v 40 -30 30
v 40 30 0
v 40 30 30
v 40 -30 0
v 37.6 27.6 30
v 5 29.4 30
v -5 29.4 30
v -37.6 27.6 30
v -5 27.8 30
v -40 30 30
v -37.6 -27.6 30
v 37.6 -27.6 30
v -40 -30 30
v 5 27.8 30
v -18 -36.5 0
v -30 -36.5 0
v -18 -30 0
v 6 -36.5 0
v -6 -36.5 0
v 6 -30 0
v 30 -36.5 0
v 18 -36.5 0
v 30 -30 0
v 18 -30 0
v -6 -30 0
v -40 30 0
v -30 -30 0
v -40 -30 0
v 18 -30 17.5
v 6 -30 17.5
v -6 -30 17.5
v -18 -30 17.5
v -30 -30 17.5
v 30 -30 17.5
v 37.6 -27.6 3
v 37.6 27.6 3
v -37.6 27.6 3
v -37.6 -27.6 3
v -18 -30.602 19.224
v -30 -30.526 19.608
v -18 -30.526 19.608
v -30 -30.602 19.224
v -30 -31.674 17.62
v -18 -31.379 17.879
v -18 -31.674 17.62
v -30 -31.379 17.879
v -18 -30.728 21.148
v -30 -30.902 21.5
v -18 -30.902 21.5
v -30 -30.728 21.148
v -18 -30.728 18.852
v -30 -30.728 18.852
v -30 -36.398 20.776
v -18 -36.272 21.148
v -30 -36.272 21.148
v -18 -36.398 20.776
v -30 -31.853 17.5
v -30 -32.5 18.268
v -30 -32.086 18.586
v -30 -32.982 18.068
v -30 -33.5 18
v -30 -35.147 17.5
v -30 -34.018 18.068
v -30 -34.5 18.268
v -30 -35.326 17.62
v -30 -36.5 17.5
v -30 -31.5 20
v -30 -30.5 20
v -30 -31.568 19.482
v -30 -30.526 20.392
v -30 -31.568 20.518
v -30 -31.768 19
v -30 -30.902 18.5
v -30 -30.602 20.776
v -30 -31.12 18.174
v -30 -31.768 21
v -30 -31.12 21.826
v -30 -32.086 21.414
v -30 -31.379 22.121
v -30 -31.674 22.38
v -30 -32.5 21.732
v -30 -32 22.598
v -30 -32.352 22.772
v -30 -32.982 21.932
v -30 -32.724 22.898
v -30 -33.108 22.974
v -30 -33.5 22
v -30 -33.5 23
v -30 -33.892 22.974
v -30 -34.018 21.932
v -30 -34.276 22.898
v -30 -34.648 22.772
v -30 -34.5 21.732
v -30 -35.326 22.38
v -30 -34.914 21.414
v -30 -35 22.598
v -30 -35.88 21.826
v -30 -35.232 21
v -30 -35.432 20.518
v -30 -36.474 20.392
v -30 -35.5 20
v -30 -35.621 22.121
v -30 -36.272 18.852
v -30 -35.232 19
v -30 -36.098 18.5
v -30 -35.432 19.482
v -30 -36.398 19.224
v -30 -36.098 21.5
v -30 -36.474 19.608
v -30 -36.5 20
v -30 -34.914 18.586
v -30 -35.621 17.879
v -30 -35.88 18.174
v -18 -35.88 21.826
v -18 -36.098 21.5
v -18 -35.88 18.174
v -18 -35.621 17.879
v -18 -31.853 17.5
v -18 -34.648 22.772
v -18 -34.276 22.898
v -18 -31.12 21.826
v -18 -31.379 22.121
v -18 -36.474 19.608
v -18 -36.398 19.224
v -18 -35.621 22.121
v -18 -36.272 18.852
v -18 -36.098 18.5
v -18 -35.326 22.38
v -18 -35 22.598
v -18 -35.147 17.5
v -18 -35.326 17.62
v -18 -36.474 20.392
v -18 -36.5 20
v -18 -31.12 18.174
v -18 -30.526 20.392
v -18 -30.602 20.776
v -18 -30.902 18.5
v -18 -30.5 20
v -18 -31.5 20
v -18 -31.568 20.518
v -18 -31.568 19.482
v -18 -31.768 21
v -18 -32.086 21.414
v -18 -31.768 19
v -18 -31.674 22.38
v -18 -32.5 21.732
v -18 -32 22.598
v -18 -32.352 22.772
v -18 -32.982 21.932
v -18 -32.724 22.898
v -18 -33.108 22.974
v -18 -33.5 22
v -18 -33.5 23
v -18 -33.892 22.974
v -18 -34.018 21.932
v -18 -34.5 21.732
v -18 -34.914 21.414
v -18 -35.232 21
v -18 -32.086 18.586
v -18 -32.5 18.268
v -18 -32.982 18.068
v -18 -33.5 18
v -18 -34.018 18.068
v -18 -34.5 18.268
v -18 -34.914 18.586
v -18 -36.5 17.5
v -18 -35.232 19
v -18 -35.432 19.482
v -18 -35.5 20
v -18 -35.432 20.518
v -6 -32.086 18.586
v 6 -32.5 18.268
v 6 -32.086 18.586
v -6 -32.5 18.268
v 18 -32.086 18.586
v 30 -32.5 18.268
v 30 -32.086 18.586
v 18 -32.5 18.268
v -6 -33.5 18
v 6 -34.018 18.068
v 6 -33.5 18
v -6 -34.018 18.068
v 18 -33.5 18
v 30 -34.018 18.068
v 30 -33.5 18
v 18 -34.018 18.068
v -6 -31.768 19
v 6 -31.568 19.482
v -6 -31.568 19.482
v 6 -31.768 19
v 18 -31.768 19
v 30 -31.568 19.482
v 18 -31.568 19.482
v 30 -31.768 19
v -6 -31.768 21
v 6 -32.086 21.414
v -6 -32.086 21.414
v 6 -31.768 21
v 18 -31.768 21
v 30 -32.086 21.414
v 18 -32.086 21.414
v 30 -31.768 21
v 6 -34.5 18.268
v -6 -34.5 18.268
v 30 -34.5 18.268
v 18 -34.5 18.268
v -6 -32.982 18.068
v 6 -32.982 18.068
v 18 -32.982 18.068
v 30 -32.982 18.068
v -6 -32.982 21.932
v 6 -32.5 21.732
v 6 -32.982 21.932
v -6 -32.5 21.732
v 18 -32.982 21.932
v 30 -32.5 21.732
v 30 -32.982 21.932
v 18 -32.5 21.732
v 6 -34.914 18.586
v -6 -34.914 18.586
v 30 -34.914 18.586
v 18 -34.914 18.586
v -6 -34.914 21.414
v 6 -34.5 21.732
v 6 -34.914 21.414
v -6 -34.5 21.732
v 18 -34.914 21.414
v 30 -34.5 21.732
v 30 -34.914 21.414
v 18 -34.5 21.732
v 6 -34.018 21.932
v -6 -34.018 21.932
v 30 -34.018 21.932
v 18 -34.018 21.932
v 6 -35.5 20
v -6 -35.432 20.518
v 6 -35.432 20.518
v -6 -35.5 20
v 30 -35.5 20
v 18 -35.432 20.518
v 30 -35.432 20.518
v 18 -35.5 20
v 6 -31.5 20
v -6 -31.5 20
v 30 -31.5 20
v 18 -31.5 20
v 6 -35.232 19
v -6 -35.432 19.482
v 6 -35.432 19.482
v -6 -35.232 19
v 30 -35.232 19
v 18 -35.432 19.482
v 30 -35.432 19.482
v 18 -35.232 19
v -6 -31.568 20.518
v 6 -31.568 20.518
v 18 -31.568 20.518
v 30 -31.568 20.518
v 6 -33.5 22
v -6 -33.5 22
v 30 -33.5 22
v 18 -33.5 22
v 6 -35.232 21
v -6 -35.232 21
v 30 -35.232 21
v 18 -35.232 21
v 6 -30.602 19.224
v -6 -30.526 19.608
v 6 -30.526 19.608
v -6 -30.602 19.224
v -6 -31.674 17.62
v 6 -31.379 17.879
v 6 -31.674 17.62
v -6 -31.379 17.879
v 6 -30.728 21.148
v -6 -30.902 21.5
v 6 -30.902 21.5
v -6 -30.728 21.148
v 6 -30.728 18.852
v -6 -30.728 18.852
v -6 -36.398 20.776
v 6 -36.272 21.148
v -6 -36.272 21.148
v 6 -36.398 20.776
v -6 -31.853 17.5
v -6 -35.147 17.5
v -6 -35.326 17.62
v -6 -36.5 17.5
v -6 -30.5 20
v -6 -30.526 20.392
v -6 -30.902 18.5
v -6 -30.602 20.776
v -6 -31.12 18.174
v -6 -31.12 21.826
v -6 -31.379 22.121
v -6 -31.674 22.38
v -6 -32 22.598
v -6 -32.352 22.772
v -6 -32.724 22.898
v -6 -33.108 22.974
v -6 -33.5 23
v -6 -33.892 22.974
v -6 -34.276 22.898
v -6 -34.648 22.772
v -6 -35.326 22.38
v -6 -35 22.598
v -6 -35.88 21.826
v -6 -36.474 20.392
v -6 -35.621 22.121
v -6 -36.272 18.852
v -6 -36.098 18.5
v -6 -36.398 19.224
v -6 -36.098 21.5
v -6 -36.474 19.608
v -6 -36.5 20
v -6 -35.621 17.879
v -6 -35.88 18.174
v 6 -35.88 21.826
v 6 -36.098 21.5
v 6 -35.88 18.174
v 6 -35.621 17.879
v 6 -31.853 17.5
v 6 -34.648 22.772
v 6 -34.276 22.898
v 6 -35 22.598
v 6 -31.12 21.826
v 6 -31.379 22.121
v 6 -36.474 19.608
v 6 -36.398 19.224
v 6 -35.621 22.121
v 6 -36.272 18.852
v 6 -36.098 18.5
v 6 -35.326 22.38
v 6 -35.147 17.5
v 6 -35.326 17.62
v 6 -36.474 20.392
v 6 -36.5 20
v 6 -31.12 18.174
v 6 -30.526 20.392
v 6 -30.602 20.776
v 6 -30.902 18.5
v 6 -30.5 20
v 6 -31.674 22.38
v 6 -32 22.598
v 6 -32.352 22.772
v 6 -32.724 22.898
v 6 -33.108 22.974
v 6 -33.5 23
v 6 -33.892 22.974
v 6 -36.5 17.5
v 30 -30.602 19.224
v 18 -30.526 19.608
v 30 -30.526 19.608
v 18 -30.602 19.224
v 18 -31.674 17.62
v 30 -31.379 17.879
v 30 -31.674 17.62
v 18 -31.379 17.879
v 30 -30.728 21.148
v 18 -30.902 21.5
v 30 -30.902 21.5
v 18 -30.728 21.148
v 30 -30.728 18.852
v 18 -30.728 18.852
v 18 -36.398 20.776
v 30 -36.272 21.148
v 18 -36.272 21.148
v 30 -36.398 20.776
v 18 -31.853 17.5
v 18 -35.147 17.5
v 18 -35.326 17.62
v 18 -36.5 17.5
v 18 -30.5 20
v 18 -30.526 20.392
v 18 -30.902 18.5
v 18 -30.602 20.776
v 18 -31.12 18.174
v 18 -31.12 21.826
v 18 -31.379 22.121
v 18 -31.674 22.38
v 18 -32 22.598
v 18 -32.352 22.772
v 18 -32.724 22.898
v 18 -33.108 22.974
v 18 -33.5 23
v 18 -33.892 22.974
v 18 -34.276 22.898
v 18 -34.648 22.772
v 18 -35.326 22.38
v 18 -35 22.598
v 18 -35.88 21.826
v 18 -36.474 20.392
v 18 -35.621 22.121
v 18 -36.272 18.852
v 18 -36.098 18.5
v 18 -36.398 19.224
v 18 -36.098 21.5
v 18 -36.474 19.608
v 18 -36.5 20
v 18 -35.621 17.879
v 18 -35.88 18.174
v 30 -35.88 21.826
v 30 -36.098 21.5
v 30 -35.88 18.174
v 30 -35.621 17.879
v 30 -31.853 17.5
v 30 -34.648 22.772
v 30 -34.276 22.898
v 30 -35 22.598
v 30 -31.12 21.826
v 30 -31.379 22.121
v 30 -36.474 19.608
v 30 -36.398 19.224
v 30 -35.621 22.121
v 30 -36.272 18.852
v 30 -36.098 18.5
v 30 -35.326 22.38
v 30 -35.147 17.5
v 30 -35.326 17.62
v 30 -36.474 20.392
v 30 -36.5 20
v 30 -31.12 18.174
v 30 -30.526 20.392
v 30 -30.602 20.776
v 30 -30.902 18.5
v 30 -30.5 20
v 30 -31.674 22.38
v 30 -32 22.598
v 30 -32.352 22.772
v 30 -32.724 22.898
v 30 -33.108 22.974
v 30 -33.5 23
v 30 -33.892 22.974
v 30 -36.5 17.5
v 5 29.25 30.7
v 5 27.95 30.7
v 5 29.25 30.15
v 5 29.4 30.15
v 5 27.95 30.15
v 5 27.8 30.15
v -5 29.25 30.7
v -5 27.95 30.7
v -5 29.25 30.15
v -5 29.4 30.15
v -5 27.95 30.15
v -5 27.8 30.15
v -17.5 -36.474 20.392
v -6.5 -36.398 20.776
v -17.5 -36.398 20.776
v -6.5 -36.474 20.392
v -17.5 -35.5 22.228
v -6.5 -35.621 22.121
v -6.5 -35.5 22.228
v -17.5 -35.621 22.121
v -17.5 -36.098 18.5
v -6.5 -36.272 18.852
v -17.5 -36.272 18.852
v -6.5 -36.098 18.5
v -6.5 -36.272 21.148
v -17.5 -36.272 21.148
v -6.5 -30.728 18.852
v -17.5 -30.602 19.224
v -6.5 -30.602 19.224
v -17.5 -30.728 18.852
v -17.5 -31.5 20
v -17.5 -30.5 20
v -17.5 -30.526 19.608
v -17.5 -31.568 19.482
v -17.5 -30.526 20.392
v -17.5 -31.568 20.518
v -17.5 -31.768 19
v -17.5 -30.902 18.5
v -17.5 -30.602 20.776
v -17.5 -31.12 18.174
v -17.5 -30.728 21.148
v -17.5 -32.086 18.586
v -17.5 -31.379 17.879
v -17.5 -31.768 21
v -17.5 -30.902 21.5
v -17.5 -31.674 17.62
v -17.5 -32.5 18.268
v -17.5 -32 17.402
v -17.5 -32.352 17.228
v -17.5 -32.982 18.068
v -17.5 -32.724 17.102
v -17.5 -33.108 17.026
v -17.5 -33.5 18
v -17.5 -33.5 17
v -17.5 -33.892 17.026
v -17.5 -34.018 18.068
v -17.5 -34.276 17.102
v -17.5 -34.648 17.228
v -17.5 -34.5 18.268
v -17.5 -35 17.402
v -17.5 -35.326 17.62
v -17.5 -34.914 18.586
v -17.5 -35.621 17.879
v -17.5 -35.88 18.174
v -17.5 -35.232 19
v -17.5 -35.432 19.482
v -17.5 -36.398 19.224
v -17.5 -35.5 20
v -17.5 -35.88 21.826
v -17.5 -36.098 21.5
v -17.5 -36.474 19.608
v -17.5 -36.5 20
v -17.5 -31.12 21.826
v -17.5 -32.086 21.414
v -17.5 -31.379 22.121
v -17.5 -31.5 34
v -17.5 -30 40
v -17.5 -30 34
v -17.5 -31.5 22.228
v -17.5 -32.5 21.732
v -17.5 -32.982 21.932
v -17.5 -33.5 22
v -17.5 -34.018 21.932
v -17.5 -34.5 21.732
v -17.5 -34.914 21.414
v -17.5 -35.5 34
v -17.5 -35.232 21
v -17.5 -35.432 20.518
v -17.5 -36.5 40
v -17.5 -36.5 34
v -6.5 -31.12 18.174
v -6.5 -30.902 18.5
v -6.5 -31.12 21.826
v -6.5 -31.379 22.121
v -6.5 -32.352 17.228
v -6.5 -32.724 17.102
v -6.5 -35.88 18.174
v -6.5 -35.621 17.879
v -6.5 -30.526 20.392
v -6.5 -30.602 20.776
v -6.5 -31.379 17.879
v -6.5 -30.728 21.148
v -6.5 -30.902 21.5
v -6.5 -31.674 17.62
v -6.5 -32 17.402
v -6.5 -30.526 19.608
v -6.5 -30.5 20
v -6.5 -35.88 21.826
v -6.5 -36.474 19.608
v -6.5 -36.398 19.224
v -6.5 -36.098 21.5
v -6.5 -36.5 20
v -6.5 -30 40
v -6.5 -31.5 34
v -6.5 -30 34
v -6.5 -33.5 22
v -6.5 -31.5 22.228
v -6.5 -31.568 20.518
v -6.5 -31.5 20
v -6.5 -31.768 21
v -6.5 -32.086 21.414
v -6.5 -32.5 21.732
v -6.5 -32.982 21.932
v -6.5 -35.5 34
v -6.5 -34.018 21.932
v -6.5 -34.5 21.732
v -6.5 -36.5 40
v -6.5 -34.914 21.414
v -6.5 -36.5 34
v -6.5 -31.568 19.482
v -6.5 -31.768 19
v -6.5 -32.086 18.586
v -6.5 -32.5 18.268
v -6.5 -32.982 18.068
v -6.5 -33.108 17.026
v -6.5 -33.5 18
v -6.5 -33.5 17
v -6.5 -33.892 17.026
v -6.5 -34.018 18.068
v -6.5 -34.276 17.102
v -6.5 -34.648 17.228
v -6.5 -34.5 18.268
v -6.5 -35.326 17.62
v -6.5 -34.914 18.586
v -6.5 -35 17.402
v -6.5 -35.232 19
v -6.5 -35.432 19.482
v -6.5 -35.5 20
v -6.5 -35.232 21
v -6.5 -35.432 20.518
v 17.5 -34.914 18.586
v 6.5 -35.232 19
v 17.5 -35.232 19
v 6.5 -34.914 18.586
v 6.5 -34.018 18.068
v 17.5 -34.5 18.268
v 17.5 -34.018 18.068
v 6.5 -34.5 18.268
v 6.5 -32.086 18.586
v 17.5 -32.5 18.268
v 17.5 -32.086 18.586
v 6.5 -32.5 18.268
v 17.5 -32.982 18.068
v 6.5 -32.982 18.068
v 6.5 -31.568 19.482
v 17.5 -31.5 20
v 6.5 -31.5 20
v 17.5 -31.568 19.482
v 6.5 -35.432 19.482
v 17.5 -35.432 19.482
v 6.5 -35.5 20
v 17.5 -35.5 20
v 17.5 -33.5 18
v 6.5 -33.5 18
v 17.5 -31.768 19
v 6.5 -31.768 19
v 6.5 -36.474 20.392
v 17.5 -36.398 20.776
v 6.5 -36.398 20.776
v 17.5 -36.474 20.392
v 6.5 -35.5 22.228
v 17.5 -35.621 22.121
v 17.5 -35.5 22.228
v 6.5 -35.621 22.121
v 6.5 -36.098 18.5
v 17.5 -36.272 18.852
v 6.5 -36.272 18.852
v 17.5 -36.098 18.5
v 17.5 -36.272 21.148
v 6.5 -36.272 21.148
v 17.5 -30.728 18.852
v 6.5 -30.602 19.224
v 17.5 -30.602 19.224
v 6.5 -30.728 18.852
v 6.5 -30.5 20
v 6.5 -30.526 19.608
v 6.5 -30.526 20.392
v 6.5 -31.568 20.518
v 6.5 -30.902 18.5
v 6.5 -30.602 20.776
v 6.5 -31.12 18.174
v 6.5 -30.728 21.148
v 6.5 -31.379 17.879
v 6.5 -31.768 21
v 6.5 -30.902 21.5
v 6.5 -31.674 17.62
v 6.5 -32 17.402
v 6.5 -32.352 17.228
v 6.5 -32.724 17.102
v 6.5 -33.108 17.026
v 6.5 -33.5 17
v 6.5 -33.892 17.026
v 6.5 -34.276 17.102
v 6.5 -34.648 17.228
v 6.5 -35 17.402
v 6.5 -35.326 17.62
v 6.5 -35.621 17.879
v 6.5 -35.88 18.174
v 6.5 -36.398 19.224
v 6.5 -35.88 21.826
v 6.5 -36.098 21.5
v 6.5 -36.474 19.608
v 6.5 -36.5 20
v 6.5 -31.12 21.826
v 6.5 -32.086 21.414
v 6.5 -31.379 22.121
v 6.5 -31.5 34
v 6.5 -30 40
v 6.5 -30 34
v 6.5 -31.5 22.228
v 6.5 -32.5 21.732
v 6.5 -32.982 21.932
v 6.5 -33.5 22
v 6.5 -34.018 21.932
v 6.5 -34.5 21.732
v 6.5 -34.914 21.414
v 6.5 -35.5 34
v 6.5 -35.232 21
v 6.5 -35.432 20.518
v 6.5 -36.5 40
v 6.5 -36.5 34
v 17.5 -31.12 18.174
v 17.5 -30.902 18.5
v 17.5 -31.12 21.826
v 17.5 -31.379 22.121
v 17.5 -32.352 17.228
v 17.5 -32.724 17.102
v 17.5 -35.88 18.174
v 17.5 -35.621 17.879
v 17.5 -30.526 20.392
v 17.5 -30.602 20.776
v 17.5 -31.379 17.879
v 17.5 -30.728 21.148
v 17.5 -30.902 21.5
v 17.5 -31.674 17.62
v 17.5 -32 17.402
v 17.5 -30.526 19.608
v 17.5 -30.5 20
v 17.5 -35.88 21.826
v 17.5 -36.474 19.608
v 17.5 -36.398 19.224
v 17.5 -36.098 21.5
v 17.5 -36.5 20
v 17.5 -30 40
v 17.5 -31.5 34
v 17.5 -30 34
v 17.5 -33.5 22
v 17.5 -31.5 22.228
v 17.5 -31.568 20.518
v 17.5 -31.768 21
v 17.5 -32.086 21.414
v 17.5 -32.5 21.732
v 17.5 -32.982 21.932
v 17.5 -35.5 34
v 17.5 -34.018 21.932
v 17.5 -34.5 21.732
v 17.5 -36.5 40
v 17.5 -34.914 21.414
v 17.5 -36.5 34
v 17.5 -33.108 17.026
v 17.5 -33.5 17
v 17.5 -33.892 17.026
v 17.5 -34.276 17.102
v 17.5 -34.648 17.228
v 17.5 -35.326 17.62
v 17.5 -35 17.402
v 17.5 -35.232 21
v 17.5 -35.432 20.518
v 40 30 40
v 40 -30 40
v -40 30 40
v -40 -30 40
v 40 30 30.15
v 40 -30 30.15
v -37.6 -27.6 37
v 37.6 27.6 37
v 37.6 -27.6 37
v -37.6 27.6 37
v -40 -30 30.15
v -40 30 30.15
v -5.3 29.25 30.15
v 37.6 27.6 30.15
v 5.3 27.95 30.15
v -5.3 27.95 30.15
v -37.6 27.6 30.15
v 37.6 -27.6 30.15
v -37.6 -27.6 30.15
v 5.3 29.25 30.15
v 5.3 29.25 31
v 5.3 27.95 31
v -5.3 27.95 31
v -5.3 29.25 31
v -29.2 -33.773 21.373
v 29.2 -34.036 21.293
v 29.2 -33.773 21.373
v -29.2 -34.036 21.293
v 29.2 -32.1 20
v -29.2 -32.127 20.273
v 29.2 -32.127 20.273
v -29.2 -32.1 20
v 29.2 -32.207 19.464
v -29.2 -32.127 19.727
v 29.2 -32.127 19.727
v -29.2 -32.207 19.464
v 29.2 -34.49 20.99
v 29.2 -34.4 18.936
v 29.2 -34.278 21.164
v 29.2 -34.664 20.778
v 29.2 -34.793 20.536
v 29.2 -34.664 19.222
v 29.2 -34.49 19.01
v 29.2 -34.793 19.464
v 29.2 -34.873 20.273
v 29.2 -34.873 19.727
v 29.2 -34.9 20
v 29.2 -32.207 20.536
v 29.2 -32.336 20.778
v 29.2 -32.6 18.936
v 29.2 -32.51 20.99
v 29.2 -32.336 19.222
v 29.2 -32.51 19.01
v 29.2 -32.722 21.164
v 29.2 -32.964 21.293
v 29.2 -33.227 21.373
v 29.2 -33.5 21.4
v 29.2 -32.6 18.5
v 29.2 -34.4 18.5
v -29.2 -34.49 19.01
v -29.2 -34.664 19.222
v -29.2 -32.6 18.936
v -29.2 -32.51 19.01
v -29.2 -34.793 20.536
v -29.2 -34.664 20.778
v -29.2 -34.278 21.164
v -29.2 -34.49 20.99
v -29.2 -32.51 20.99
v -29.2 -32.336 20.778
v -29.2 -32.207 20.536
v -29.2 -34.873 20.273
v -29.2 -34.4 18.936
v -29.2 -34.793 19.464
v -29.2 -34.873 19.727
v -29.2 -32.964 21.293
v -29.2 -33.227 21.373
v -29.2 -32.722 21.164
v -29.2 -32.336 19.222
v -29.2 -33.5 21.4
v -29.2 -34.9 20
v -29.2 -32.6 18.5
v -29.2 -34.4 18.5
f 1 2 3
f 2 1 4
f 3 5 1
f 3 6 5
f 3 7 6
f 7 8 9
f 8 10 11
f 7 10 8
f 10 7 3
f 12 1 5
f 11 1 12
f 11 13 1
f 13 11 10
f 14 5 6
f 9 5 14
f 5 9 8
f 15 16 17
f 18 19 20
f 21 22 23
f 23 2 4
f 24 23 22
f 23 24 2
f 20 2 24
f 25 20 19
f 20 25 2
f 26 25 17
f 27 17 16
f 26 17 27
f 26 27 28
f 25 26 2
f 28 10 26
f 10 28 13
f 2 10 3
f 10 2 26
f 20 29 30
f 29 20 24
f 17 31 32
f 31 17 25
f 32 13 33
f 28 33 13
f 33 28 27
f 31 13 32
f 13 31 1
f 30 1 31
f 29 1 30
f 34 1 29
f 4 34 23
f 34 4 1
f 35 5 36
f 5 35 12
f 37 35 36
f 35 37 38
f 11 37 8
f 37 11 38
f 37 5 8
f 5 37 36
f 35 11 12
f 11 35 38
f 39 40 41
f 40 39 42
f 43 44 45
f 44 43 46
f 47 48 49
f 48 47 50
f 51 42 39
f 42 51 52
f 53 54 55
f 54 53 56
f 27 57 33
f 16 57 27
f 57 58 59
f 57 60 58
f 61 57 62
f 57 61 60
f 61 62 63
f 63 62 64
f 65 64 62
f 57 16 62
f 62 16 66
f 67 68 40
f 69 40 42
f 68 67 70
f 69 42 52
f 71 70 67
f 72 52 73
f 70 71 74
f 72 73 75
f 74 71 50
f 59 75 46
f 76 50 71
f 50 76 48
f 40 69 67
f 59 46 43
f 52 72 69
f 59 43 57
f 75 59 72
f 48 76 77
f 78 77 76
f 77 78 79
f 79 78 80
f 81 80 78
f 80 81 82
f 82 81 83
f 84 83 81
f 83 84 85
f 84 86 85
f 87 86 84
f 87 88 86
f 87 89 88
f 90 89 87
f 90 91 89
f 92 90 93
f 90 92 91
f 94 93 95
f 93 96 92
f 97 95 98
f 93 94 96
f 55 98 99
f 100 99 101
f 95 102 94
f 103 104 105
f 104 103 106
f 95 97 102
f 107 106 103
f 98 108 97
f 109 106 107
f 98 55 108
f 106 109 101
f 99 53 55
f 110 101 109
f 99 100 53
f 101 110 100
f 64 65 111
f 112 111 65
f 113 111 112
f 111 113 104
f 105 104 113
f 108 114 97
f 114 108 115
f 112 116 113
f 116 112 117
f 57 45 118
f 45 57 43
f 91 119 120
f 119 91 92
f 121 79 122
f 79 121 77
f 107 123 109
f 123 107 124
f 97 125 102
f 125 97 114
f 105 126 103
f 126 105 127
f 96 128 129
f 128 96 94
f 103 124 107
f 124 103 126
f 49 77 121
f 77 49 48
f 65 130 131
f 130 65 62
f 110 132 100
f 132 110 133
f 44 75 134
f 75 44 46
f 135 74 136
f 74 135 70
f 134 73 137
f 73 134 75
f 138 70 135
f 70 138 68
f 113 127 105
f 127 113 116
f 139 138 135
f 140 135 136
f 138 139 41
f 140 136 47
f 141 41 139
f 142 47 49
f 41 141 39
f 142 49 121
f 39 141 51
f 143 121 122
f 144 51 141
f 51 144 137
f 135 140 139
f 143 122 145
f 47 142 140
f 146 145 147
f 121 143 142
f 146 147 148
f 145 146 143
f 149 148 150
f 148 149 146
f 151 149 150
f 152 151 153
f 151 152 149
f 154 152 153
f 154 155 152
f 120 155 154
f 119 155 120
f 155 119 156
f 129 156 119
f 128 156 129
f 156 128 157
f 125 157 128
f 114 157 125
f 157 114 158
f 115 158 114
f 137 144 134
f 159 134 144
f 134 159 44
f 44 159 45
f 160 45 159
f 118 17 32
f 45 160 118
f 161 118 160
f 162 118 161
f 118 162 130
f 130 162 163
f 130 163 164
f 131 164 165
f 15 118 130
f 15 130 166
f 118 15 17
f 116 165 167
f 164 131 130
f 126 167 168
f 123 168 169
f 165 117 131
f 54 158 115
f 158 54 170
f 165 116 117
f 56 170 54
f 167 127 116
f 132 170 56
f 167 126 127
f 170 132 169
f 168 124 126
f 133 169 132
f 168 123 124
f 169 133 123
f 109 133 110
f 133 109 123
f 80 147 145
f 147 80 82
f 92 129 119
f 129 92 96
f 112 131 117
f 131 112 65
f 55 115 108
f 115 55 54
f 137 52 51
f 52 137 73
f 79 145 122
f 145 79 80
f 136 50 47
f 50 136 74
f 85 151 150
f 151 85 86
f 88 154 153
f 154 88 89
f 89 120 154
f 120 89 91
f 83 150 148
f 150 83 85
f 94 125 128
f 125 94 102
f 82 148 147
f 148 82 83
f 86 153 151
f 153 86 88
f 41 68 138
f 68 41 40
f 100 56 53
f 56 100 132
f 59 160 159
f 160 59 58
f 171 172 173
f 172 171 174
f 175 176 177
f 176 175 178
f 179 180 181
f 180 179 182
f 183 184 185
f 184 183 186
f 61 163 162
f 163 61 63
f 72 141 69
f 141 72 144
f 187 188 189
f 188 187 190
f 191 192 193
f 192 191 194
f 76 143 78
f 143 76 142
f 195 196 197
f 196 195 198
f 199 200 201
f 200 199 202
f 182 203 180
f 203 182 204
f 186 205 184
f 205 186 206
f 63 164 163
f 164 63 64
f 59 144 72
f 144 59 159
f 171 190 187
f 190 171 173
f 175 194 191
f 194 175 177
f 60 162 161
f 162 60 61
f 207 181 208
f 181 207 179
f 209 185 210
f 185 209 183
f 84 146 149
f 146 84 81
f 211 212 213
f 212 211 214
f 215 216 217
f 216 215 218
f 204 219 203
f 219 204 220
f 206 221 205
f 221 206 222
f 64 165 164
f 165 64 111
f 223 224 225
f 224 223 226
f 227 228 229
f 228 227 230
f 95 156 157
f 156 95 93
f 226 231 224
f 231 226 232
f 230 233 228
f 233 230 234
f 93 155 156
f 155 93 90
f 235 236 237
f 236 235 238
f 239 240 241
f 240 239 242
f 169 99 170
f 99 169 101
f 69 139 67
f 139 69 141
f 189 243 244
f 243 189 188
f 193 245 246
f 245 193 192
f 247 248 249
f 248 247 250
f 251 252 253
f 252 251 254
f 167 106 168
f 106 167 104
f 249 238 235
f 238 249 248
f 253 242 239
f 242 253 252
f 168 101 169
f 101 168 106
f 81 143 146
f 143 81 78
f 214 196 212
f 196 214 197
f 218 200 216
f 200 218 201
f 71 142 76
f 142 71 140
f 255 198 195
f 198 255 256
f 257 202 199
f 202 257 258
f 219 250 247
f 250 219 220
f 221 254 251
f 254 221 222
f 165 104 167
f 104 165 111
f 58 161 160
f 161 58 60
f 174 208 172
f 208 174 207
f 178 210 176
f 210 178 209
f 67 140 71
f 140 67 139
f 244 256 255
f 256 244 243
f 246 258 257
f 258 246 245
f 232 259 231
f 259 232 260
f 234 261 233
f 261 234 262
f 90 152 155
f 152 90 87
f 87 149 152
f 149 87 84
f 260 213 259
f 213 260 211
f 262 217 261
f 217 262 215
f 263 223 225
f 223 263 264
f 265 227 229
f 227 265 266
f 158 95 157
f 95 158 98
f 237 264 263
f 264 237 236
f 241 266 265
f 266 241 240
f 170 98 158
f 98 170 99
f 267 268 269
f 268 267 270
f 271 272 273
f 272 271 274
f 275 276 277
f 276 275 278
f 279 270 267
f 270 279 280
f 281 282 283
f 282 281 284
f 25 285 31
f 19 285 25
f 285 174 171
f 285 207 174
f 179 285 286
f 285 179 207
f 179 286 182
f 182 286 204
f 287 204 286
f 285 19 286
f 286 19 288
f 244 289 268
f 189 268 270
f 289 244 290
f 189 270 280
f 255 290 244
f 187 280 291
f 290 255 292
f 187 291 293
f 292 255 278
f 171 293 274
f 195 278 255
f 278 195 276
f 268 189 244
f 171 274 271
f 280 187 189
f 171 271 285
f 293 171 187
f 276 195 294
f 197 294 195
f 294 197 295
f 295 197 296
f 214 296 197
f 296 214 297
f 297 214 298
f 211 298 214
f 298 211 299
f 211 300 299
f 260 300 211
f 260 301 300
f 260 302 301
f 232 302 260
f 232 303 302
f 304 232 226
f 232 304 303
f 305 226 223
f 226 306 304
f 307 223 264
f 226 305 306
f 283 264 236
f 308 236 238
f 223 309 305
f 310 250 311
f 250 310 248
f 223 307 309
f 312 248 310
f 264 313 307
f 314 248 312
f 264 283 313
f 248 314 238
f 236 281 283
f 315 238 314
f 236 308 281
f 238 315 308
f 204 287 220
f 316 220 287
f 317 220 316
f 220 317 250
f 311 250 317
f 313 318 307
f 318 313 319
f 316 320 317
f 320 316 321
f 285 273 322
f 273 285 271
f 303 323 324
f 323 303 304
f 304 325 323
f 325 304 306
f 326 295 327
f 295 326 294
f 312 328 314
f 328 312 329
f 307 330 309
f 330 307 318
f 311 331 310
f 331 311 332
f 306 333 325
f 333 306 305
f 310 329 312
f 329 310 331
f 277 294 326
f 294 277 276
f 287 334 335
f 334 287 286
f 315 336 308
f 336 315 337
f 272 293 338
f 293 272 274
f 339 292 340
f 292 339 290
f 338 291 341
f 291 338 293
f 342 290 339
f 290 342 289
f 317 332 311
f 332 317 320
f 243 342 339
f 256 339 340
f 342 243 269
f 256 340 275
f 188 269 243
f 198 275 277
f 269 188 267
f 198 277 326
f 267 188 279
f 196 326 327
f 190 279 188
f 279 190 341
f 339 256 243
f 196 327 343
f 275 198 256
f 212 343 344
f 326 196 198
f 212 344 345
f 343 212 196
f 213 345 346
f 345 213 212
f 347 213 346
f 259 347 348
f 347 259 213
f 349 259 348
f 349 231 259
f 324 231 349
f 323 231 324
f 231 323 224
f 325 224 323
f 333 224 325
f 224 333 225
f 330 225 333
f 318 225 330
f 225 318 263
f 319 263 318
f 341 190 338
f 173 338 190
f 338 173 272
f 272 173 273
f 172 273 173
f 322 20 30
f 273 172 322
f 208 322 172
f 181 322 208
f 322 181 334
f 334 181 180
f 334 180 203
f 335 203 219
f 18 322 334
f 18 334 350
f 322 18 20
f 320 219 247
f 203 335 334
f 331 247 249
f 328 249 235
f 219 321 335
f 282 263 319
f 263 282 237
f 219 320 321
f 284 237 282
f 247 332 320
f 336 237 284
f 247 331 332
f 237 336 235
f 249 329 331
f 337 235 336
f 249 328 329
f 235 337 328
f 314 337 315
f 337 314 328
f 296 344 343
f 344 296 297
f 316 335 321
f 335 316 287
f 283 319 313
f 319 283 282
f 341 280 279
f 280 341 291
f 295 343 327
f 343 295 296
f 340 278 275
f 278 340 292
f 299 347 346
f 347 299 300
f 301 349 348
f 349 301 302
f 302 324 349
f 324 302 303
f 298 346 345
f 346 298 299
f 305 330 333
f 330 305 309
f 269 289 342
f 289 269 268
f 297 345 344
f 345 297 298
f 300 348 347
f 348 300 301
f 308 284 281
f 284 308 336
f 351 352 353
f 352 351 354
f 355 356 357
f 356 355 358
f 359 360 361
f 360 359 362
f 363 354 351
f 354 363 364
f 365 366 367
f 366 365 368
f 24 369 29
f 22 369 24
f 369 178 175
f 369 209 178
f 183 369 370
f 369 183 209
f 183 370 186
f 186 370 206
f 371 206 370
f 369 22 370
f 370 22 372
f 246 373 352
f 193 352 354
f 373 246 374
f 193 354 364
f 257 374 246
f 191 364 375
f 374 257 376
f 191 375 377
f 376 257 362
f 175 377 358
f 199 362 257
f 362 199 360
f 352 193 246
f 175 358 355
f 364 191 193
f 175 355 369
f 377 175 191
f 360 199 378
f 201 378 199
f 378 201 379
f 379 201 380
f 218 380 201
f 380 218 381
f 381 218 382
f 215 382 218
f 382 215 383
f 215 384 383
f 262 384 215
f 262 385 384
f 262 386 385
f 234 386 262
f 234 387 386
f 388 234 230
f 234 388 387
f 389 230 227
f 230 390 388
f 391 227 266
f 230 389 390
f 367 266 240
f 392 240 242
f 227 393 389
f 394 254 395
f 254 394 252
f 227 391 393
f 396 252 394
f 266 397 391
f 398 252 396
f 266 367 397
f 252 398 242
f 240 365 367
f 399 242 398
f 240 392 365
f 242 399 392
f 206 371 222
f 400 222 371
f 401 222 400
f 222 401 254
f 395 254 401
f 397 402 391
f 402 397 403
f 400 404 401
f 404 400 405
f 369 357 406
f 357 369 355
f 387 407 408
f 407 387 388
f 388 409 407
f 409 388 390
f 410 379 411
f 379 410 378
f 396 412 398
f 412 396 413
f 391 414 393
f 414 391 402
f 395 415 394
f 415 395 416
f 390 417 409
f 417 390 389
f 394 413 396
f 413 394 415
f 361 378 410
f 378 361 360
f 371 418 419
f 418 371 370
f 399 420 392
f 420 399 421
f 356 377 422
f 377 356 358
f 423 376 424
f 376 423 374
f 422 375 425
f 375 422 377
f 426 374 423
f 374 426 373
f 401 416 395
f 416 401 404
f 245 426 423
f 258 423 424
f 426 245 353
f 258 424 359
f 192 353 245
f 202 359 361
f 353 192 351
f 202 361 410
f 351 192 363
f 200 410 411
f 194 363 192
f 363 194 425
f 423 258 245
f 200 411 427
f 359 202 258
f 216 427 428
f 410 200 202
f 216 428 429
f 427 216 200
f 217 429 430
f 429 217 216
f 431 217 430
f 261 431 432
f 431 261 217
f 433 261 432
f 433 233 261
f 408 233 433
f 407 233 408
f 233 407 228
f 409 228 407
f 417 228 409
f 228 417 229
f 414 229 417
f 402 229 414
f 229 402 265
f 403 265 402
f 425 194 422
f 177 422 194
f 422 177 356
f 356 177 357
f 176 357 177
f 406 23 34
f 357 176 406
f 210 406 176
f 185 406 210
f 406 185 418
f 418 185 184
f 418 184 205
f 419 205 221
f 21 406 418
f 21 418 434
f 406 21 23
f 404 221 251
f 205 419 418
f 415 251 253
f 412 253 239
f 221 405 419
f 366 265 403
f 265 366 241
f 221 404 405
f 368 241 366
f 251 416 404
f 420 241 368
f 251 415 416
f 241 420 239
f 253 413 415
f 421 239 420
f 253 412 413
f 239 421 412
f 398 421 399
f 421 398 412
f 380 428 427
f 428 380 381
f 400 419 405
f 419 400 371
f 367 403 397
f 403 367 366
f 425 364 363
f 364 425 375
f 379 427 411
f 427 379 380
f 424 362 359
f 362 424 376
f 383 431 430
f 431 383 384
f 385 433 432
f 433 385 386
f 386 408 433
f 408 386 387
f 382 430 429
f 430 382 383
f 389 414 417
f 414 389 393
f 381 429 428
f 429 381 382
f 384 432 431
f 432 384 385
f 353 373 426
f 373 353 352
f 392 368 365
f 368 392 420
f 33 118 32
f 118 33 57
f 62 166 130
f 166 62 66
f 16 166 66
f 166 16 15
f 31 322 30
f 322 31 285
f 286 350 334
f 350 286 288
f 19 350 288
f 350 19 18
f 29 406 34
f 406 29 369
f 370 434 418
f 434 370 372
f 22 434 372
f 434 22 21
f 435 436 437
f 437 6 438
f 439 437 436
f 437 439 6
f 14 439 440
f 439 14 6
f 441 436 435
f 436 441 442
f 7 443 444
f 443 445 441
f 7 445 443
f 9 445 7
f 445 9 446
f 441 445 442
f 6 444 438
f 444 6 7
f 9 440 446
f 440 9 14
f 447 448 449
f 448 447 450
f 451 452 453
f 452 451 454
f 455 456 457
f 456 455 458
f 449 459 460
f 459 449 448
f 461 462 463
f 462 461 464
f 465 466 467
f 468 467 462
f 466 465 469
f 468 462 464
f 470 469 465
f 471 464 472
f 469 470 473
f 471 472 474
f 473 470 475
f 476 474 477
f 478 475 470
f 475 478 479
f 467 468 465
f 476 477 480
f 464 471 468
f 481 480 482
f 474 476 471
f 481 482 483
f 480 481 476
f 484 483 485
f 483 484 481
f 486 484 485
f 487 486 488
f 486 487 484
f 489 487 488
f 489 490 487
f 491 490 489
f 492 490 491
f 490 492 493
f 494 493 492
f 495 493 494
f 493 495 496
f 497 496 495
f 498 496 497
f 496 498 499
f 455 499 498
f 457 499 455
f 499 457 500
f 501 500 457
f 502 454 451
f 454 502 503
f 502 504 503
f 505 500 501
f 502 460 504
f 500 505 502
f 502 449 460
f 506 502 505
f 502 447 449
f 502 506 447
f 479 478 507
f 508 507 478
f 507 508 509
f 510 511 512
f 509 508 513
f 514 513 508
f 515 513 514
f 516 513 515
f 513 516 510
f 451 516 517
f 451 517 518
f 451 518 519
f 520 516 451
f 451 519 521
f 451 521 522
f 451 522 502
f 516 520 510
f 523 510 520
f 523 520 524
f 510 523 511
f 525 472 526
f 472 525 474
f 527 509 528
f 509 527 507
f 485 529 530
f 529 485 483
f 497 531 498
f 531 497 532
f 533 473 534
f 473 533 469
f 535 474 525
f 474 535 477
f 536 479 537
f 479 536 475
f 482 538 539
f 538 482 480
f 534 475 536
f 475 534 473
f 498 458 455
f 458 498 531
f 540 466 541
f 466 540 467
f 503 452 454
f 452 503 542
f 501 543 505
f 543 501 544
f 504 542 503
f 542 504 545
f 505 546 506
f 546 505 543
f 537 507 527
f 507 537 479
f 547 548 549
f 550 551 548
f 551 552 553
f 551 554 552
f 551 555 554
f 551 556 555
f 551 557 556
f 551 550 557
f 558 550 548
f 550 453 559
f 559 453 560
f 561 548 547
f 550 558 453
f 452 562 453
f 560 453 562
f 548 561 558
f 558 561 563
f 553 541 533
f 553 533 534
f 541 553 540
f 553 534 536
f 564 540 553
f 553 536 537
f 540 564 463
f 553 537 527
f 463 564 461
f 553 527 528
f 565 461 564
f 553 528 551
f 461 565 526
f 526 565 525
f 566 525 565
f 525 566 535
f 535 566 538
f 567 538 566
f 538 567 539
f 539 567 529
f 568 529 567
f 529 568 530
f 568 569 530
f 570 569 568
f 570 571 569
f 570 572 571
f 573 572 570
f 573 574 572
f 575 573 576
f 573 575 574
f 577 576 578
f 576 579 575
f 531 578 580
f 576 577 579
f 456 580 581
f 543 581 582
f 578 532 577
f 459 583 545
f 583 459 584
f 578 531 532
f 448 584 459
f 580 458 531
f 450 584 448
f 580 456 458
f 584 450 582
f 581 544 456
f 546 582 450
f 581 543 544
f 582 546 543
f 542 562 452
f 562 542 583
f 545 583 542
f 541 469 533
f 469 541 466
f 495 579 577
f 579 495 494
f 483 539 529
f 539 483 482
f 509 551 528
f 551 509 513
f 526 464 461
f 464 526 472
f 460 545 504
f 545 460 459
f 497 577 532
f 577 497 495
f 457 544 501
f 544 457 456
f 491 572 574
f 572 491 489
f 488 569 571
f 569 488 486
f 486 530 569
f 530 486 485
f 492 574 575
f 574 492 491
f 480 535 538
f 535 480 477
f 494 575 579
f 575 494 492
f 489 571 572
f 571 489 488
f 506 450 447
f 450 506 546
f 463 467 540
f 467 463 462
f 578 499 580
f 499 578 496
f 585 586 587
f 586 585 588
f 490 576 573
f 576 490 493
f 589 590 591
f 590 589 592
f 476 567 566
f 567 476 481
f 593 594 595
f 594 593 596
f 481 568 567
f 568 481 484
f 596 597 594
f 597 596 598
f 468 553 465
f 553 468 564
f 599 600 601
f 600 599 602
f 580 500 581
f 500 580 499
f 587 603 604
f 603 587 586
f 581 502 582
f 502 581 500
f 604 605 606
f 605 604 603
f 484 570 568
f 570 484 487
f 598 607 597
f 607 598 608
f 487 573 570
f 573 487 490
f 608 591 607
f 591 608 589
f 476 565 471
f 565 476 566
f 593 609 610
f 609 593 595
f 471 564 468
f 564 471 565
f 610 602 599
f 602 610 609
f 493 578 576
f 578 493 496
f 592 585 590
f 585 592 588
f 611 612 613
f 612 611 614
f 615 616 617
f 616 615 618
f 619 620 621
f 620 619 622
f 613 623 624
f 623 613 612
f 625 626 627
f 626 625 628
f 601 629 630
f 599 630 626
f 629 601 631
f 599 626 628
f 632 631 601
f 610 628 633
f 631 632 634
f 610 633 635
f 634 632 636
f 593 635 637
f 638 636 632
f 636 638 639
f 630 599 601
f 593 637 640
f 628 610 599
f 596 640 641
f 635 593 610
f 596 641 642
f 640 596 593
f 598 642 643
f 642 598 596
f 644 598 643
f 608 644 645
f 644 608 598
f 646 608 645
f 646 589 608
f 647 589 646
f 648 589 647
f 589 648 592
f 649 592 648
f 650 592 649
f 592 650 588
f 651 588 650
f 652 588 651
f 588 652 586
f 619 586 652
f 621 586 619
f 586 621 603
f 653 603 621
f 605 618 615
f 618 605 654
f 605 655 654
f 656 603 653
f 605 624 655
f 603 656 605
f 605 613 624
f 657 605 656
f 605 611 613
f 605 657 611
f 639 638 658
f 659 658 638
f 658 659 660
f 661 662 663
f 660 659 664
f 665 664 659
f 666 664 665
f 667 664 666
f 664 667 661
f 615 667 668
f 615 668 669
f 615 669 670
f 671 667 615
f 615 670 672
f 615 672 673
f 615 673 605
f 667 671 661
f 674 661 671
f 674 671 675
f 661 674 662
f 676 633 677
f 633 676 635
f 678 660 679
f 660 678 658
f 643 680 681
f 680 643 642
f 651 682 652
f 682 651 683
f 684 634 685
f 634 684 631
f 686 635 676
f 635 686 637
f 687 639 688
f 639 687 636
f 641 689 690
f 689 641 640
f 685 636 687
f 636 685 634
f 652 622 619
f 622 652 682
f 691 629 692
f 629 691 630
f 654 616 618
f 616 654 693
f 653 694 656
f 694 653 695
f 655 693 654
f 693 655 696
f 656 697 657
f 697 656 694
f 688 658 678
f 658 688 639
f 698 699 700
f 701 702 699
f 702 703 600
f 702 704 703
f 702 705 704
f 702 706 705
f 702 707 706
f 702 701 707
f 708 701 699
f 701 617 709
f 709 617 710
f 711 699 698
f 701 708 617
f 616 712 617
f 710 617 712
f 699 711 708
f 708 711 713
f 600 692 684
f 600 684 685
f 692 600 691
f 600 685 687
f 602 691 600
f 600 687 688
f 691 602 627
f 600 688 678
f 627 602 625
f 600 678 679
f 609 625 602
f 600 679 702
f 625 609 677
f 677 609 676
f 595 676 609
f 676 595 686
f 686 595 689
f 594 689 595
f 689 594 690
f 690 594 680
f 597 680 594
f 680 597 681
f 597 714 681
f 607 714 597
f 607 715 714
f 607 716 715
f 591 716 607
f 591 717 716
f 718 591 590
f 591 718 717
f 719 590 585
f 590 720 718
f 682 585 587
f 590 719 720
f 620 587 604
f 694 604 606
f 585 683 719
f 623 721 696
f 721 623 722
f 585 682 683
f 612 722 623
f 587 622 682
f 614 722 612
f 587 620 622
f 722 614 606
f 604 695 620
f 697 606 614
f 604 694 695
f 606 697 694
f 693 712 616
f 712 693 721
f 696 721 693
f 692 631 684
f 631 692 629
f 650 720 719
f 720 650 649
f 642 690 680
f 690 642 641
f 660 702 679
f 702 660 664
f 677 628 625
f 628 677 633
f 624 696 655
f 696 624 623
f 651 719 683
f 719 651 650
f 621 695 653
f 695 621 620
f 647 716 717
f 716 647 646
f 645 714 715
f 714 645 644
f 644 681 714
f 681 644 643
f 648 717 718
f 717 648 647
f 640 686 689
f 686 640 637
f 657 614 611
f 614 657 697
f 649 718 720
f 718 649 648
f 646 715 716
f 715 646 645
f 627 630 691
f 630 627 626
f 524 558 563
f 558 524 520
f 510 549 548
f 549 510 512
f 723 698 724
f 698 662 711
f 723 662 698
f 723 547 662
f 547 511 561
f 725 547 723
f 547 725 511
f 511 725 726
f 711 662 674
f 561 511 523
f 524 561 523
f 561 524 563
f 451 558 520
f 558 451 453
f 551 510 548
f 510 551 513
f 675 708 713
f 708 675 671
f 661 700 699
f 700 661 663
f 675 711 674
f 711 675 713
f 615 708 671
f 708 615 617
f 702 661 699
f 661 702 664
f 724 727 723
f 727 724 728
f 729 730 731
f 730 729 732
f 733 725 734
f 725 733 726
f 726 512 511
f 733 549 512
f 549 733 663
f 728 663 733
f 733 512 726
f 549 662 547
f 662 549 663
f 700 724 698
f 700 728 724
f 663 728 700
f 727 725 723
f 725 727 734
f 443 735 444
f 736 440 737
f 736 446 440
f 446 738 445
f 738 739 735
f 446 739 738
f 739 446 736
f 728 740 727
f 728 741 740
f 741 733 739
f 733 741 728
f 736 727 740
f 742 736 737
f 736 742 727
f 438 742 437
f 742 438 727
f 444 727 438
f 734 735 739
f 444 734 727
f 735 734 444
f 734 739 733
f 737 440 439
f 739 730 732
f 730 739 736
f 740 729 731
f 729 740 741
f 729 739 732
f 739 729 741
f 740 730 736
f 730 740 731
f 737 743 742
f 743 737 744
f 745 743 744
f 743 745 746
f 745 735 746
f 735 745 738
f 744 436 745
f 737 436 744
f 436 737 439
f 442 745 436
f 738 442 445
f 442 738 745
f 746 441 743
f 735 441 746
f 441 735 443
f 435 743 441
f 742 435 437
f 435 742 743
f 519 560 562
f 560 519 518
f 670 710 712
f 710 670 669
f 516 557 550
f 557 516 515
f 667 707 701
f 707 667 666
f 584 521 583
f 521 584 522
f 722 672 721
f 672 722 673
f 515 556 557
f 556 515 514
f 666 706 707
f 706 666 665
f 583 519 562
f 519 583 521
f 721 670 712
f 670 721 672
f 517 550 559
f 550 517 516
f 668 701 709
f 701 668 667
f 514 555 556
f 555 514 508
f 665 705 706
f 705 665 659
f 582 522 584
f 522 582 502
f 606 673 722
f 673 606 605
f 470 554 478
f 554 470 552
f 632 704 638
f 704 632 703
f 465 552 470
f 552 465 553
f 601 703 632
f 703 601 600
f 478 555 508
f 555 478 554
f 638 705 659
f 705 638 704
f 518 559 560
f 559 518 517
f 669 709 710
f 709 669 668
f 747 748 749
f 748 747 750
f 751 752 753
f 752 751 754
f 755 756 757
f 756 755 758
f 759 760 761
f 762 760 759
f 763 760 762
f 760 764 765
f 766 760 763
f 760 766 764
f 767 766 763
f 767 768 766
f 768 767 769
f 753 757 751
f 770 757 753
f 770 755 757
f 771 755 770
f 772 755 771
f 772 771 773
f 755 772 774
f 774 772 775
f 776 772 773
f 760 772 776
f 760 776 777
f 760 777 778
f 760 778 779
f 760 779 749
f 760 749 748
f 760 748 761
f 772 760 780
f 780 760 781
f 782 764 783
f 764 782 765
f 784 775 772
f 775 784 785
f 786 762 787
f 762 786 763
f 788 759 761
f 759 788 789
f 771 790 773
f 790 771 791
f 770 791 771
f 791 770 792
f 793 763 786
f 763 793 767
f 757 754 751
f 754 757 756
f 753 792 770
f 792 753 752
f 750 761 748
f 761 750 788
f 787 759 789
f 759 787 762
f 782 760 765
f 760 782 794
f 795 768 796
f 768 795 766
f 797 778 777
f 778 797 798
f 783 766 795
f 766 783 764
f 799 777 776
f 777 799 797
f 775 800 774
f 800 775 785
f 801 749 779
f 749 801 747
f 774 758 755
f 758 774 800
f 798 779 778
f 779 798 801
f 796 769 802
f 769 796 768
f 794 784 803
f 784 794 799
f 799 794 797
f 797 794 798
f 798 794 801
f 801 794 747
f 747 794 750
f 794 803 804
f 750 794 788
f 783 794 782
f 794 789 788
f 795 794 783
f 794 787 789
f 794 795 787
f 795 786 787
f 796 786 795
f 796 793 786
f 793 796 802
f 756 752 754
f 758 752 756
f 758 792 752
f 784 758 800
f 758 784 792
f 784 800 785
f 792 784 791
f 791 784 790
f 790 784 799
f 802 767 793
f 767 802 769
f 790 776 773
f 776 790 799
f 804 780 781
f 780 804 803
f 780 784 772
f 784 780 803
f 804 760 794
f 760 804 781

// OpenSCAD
part = "assembly"; // [base, lid, pin, assembly]
cadverify_only = "";
module instance(name, part, unit = 1) {
  echo(cadverify_instance = [name, part, unit]);
  if (cadverify_only == "" || cadverify_only == name) children();
}
Ya = -33.5; Za = 20; Kr = 3.0; Br = 2.0; Pr = 1.4;
BX = [[-30,-18],[-6,6],[18,30]];
LX = [[-17.5,-6.5],[6.5,17.5]];
module barrelX(x0, x1) {
  difference() {
    translate([0,Ya,Za]) rotate([0,90,0]) translate([0,0,(x0+x1)/2])
      cylinder(h=x1-x0, r=Kr, center=true, $fn=48);
    translate([0,Ya,Za]) rotate([0,90,0]) translate([0,0,(x0+x1)/2])
      cylinder(h=(x1-x0)+1.0, r=Br, center=true, $fn=24);
  }
}
module base_geom() {
  difference() {
    union() {
      difference() {
        translate([-40,-30,0]) cube([80,60,30]);
        translate([-37.6,-27.6,3]) cube([75.2,55.2,27.01]);
      }
      for (b=BX) {
        translate([b[0],-36.5,0]) cube([b[1]-b[0],6.5,17.5]);
        barrelX(b[0], b[1]);
      }
      translate([-5,27.8,30]) cube([10,1.6,0.7]);
    }
    translate([0,Ya,Za]) rotate([0,90,0]) translate([0,0,0])
      cylinder(h=62, r=Br, center=true, $fn=24);
  }
}
module lid_open() {
  difference() {
    union() {
      translate([-40,-97,0]) cube([80,60,3]);
      translate([-40,-97,3]) cube([80,2.4,6.85]);
      translate([-40,-39.4,3]) cube([80,2.4,6.85]);
      translate([-40,-97,3]) cube([2.4,60,6.85]);
      translate([37.6,-97,3]) cube([2.4,60,6.85]);
      for (b=LX) {
        translate([b[0],-39,0]) cube([b[1]-b[0],8.5,6]);
        translate([b[0],-35.5,3]) cube([b[1]-b[0],4,17.5]);
        barrelX(b[0], b[1]);
      }
    }
    translate([-5.3,-96.25,9.0]) cube([10.6,1.3,1.1]);
    translate([0,Ya,Za]) rotate([0,90,0]) translate([0,0,0])
      cylinder(h=62, r=Br, center=true, $fn=24);
  }
}
module pin_geom() {
  union() {
    translate([-29.2,0,1.5]) rotate([0,90,0])
      cylinder(h=58.4, r=Pr, center=false, $fn=32);
    translate([-29.2,-0.9,0]) cube([58.4,1.8,0.5]);
  }
}
module lid_closed() {
  translate([0,Ya,Za]) rotate([180,0,0]) translate([0,-Ya,-Za]) lid_open();
}
module pin_placed() {
  translate([0,Ya,Za-1.5]) pin_geom();
}
if (part=="base") {
  base_geom();
  echo(cadverify_spec=[
    ["bounds", [[-40,-36.5,0],[40,30,30.7]]],
    ["bodies", 1],
    ["support_faces", [["base","-z",4000]]],
    ["overhangs_allowed", [["hinge", [[-30,-37,16],[30,-30,24]]]]],
    ["copies", 1],
    ["details", [
      ["bottom","thickness",[0,0,-1],[0,0,1],3],
      ["cavity","void",[[-37.6,-27.6,3],[37.6,27.6,30]],0.9],
      ["knuckle","material",[[-30,-36.5,17],[-18,-30.5,23]],0.5],
      ["bore","hole",[-31,-33.5,20],[1,0,0],[[0,4.0],[10,4.0]]],
      ["catch","material",[[-5,27.8,30],[5,29.4,30.7]],0.6]
    ]]
  ]);
} else if (part=="lid") {
  lid_open();
  echo(cadverify_spec=[
    ["bounds", [[-40,-97,0],[40,-30.5,23]]],
    ["bodies", 1],
    ["support_faces", [["lid","-z",4000]]],
    ["overhangs_allowed", [["hinge", [[-30,-37,16],[30,-30,24]]]]],
    ["copies", 1],
    ["details", [
      ["plate","thickness",[0,-67,-1],[0,0,1],3],
      ["pocket","void",[[-37.6,-94.6,3],[37.6,-39.4,9.85]],0.9],
      ["knuckle","material",[[-17.5,-36.5,17],[-6.5,-30.5,23]],0.4],
      ["bore","hole",[-18,-33.5,20],[1,0,0],[[0,4.0],[9,4.0]]],
      ["notch","void",[[-5.3,-96.25,9.0],[5.3,-94.95,10.1]],0.9]
    ]]
  ]);
} else if (part=="pin") {
  pin_geom();
  echo(cadverify_spec=[
    ["bounds", [[-29.2,-1.4,0],[29.2,1.4,2.9]]],
    ["bodies", 1],
    ["support_faces", [["pin","-z",50]]],
    ["overhangs_allowed", [["pinFlankA", [[-29.3,-1.1,0.2],[29.3,-0.8,0.6]]],["pinFlankB", [[-29.3,0.8,0.2],[29.3,1.1,0.6]]]]],
    ["copies", 1],
    ["details", [
      ["shaft","thickness",[0,5,1.5],[0,-1,0],2.8],
      ["fin","thickness",[0,0,-1],[0,0,1],0.5]
    ]]
  ]);
} else {
  instance("base","base") base_geom();
  instance("lid","lid") lid_closed();
  instance("pin","pin") pin_placed();
  echo(cadverify_spec=[
    ["bounds", [[-40,-36.5,0],[40,30,40]]],
    ["support_faces", [["bed","-z",4000]]],
    ["allowed_interferences", [["base","lid","catch press"]]],
    ["motions", [["swing",["lid"],"rotate",[0,-33.5,20],[1,0,0],[0,180],["flex",[["lid","base",0.5,"catch entry"]]]]]],
    ["assembly_order", [[["base"],[0,0,0]],[["lid"],[0,0,1]],[["pin"],[-1,0,0]]]],
    ["print_in_place", 0.4],
    ["print_pose", [["swing",180]]],
    ["overhangs_allowed", [["hinge", [[-30,-37,16],[30,-30,24]]]]]
  ]);
}
